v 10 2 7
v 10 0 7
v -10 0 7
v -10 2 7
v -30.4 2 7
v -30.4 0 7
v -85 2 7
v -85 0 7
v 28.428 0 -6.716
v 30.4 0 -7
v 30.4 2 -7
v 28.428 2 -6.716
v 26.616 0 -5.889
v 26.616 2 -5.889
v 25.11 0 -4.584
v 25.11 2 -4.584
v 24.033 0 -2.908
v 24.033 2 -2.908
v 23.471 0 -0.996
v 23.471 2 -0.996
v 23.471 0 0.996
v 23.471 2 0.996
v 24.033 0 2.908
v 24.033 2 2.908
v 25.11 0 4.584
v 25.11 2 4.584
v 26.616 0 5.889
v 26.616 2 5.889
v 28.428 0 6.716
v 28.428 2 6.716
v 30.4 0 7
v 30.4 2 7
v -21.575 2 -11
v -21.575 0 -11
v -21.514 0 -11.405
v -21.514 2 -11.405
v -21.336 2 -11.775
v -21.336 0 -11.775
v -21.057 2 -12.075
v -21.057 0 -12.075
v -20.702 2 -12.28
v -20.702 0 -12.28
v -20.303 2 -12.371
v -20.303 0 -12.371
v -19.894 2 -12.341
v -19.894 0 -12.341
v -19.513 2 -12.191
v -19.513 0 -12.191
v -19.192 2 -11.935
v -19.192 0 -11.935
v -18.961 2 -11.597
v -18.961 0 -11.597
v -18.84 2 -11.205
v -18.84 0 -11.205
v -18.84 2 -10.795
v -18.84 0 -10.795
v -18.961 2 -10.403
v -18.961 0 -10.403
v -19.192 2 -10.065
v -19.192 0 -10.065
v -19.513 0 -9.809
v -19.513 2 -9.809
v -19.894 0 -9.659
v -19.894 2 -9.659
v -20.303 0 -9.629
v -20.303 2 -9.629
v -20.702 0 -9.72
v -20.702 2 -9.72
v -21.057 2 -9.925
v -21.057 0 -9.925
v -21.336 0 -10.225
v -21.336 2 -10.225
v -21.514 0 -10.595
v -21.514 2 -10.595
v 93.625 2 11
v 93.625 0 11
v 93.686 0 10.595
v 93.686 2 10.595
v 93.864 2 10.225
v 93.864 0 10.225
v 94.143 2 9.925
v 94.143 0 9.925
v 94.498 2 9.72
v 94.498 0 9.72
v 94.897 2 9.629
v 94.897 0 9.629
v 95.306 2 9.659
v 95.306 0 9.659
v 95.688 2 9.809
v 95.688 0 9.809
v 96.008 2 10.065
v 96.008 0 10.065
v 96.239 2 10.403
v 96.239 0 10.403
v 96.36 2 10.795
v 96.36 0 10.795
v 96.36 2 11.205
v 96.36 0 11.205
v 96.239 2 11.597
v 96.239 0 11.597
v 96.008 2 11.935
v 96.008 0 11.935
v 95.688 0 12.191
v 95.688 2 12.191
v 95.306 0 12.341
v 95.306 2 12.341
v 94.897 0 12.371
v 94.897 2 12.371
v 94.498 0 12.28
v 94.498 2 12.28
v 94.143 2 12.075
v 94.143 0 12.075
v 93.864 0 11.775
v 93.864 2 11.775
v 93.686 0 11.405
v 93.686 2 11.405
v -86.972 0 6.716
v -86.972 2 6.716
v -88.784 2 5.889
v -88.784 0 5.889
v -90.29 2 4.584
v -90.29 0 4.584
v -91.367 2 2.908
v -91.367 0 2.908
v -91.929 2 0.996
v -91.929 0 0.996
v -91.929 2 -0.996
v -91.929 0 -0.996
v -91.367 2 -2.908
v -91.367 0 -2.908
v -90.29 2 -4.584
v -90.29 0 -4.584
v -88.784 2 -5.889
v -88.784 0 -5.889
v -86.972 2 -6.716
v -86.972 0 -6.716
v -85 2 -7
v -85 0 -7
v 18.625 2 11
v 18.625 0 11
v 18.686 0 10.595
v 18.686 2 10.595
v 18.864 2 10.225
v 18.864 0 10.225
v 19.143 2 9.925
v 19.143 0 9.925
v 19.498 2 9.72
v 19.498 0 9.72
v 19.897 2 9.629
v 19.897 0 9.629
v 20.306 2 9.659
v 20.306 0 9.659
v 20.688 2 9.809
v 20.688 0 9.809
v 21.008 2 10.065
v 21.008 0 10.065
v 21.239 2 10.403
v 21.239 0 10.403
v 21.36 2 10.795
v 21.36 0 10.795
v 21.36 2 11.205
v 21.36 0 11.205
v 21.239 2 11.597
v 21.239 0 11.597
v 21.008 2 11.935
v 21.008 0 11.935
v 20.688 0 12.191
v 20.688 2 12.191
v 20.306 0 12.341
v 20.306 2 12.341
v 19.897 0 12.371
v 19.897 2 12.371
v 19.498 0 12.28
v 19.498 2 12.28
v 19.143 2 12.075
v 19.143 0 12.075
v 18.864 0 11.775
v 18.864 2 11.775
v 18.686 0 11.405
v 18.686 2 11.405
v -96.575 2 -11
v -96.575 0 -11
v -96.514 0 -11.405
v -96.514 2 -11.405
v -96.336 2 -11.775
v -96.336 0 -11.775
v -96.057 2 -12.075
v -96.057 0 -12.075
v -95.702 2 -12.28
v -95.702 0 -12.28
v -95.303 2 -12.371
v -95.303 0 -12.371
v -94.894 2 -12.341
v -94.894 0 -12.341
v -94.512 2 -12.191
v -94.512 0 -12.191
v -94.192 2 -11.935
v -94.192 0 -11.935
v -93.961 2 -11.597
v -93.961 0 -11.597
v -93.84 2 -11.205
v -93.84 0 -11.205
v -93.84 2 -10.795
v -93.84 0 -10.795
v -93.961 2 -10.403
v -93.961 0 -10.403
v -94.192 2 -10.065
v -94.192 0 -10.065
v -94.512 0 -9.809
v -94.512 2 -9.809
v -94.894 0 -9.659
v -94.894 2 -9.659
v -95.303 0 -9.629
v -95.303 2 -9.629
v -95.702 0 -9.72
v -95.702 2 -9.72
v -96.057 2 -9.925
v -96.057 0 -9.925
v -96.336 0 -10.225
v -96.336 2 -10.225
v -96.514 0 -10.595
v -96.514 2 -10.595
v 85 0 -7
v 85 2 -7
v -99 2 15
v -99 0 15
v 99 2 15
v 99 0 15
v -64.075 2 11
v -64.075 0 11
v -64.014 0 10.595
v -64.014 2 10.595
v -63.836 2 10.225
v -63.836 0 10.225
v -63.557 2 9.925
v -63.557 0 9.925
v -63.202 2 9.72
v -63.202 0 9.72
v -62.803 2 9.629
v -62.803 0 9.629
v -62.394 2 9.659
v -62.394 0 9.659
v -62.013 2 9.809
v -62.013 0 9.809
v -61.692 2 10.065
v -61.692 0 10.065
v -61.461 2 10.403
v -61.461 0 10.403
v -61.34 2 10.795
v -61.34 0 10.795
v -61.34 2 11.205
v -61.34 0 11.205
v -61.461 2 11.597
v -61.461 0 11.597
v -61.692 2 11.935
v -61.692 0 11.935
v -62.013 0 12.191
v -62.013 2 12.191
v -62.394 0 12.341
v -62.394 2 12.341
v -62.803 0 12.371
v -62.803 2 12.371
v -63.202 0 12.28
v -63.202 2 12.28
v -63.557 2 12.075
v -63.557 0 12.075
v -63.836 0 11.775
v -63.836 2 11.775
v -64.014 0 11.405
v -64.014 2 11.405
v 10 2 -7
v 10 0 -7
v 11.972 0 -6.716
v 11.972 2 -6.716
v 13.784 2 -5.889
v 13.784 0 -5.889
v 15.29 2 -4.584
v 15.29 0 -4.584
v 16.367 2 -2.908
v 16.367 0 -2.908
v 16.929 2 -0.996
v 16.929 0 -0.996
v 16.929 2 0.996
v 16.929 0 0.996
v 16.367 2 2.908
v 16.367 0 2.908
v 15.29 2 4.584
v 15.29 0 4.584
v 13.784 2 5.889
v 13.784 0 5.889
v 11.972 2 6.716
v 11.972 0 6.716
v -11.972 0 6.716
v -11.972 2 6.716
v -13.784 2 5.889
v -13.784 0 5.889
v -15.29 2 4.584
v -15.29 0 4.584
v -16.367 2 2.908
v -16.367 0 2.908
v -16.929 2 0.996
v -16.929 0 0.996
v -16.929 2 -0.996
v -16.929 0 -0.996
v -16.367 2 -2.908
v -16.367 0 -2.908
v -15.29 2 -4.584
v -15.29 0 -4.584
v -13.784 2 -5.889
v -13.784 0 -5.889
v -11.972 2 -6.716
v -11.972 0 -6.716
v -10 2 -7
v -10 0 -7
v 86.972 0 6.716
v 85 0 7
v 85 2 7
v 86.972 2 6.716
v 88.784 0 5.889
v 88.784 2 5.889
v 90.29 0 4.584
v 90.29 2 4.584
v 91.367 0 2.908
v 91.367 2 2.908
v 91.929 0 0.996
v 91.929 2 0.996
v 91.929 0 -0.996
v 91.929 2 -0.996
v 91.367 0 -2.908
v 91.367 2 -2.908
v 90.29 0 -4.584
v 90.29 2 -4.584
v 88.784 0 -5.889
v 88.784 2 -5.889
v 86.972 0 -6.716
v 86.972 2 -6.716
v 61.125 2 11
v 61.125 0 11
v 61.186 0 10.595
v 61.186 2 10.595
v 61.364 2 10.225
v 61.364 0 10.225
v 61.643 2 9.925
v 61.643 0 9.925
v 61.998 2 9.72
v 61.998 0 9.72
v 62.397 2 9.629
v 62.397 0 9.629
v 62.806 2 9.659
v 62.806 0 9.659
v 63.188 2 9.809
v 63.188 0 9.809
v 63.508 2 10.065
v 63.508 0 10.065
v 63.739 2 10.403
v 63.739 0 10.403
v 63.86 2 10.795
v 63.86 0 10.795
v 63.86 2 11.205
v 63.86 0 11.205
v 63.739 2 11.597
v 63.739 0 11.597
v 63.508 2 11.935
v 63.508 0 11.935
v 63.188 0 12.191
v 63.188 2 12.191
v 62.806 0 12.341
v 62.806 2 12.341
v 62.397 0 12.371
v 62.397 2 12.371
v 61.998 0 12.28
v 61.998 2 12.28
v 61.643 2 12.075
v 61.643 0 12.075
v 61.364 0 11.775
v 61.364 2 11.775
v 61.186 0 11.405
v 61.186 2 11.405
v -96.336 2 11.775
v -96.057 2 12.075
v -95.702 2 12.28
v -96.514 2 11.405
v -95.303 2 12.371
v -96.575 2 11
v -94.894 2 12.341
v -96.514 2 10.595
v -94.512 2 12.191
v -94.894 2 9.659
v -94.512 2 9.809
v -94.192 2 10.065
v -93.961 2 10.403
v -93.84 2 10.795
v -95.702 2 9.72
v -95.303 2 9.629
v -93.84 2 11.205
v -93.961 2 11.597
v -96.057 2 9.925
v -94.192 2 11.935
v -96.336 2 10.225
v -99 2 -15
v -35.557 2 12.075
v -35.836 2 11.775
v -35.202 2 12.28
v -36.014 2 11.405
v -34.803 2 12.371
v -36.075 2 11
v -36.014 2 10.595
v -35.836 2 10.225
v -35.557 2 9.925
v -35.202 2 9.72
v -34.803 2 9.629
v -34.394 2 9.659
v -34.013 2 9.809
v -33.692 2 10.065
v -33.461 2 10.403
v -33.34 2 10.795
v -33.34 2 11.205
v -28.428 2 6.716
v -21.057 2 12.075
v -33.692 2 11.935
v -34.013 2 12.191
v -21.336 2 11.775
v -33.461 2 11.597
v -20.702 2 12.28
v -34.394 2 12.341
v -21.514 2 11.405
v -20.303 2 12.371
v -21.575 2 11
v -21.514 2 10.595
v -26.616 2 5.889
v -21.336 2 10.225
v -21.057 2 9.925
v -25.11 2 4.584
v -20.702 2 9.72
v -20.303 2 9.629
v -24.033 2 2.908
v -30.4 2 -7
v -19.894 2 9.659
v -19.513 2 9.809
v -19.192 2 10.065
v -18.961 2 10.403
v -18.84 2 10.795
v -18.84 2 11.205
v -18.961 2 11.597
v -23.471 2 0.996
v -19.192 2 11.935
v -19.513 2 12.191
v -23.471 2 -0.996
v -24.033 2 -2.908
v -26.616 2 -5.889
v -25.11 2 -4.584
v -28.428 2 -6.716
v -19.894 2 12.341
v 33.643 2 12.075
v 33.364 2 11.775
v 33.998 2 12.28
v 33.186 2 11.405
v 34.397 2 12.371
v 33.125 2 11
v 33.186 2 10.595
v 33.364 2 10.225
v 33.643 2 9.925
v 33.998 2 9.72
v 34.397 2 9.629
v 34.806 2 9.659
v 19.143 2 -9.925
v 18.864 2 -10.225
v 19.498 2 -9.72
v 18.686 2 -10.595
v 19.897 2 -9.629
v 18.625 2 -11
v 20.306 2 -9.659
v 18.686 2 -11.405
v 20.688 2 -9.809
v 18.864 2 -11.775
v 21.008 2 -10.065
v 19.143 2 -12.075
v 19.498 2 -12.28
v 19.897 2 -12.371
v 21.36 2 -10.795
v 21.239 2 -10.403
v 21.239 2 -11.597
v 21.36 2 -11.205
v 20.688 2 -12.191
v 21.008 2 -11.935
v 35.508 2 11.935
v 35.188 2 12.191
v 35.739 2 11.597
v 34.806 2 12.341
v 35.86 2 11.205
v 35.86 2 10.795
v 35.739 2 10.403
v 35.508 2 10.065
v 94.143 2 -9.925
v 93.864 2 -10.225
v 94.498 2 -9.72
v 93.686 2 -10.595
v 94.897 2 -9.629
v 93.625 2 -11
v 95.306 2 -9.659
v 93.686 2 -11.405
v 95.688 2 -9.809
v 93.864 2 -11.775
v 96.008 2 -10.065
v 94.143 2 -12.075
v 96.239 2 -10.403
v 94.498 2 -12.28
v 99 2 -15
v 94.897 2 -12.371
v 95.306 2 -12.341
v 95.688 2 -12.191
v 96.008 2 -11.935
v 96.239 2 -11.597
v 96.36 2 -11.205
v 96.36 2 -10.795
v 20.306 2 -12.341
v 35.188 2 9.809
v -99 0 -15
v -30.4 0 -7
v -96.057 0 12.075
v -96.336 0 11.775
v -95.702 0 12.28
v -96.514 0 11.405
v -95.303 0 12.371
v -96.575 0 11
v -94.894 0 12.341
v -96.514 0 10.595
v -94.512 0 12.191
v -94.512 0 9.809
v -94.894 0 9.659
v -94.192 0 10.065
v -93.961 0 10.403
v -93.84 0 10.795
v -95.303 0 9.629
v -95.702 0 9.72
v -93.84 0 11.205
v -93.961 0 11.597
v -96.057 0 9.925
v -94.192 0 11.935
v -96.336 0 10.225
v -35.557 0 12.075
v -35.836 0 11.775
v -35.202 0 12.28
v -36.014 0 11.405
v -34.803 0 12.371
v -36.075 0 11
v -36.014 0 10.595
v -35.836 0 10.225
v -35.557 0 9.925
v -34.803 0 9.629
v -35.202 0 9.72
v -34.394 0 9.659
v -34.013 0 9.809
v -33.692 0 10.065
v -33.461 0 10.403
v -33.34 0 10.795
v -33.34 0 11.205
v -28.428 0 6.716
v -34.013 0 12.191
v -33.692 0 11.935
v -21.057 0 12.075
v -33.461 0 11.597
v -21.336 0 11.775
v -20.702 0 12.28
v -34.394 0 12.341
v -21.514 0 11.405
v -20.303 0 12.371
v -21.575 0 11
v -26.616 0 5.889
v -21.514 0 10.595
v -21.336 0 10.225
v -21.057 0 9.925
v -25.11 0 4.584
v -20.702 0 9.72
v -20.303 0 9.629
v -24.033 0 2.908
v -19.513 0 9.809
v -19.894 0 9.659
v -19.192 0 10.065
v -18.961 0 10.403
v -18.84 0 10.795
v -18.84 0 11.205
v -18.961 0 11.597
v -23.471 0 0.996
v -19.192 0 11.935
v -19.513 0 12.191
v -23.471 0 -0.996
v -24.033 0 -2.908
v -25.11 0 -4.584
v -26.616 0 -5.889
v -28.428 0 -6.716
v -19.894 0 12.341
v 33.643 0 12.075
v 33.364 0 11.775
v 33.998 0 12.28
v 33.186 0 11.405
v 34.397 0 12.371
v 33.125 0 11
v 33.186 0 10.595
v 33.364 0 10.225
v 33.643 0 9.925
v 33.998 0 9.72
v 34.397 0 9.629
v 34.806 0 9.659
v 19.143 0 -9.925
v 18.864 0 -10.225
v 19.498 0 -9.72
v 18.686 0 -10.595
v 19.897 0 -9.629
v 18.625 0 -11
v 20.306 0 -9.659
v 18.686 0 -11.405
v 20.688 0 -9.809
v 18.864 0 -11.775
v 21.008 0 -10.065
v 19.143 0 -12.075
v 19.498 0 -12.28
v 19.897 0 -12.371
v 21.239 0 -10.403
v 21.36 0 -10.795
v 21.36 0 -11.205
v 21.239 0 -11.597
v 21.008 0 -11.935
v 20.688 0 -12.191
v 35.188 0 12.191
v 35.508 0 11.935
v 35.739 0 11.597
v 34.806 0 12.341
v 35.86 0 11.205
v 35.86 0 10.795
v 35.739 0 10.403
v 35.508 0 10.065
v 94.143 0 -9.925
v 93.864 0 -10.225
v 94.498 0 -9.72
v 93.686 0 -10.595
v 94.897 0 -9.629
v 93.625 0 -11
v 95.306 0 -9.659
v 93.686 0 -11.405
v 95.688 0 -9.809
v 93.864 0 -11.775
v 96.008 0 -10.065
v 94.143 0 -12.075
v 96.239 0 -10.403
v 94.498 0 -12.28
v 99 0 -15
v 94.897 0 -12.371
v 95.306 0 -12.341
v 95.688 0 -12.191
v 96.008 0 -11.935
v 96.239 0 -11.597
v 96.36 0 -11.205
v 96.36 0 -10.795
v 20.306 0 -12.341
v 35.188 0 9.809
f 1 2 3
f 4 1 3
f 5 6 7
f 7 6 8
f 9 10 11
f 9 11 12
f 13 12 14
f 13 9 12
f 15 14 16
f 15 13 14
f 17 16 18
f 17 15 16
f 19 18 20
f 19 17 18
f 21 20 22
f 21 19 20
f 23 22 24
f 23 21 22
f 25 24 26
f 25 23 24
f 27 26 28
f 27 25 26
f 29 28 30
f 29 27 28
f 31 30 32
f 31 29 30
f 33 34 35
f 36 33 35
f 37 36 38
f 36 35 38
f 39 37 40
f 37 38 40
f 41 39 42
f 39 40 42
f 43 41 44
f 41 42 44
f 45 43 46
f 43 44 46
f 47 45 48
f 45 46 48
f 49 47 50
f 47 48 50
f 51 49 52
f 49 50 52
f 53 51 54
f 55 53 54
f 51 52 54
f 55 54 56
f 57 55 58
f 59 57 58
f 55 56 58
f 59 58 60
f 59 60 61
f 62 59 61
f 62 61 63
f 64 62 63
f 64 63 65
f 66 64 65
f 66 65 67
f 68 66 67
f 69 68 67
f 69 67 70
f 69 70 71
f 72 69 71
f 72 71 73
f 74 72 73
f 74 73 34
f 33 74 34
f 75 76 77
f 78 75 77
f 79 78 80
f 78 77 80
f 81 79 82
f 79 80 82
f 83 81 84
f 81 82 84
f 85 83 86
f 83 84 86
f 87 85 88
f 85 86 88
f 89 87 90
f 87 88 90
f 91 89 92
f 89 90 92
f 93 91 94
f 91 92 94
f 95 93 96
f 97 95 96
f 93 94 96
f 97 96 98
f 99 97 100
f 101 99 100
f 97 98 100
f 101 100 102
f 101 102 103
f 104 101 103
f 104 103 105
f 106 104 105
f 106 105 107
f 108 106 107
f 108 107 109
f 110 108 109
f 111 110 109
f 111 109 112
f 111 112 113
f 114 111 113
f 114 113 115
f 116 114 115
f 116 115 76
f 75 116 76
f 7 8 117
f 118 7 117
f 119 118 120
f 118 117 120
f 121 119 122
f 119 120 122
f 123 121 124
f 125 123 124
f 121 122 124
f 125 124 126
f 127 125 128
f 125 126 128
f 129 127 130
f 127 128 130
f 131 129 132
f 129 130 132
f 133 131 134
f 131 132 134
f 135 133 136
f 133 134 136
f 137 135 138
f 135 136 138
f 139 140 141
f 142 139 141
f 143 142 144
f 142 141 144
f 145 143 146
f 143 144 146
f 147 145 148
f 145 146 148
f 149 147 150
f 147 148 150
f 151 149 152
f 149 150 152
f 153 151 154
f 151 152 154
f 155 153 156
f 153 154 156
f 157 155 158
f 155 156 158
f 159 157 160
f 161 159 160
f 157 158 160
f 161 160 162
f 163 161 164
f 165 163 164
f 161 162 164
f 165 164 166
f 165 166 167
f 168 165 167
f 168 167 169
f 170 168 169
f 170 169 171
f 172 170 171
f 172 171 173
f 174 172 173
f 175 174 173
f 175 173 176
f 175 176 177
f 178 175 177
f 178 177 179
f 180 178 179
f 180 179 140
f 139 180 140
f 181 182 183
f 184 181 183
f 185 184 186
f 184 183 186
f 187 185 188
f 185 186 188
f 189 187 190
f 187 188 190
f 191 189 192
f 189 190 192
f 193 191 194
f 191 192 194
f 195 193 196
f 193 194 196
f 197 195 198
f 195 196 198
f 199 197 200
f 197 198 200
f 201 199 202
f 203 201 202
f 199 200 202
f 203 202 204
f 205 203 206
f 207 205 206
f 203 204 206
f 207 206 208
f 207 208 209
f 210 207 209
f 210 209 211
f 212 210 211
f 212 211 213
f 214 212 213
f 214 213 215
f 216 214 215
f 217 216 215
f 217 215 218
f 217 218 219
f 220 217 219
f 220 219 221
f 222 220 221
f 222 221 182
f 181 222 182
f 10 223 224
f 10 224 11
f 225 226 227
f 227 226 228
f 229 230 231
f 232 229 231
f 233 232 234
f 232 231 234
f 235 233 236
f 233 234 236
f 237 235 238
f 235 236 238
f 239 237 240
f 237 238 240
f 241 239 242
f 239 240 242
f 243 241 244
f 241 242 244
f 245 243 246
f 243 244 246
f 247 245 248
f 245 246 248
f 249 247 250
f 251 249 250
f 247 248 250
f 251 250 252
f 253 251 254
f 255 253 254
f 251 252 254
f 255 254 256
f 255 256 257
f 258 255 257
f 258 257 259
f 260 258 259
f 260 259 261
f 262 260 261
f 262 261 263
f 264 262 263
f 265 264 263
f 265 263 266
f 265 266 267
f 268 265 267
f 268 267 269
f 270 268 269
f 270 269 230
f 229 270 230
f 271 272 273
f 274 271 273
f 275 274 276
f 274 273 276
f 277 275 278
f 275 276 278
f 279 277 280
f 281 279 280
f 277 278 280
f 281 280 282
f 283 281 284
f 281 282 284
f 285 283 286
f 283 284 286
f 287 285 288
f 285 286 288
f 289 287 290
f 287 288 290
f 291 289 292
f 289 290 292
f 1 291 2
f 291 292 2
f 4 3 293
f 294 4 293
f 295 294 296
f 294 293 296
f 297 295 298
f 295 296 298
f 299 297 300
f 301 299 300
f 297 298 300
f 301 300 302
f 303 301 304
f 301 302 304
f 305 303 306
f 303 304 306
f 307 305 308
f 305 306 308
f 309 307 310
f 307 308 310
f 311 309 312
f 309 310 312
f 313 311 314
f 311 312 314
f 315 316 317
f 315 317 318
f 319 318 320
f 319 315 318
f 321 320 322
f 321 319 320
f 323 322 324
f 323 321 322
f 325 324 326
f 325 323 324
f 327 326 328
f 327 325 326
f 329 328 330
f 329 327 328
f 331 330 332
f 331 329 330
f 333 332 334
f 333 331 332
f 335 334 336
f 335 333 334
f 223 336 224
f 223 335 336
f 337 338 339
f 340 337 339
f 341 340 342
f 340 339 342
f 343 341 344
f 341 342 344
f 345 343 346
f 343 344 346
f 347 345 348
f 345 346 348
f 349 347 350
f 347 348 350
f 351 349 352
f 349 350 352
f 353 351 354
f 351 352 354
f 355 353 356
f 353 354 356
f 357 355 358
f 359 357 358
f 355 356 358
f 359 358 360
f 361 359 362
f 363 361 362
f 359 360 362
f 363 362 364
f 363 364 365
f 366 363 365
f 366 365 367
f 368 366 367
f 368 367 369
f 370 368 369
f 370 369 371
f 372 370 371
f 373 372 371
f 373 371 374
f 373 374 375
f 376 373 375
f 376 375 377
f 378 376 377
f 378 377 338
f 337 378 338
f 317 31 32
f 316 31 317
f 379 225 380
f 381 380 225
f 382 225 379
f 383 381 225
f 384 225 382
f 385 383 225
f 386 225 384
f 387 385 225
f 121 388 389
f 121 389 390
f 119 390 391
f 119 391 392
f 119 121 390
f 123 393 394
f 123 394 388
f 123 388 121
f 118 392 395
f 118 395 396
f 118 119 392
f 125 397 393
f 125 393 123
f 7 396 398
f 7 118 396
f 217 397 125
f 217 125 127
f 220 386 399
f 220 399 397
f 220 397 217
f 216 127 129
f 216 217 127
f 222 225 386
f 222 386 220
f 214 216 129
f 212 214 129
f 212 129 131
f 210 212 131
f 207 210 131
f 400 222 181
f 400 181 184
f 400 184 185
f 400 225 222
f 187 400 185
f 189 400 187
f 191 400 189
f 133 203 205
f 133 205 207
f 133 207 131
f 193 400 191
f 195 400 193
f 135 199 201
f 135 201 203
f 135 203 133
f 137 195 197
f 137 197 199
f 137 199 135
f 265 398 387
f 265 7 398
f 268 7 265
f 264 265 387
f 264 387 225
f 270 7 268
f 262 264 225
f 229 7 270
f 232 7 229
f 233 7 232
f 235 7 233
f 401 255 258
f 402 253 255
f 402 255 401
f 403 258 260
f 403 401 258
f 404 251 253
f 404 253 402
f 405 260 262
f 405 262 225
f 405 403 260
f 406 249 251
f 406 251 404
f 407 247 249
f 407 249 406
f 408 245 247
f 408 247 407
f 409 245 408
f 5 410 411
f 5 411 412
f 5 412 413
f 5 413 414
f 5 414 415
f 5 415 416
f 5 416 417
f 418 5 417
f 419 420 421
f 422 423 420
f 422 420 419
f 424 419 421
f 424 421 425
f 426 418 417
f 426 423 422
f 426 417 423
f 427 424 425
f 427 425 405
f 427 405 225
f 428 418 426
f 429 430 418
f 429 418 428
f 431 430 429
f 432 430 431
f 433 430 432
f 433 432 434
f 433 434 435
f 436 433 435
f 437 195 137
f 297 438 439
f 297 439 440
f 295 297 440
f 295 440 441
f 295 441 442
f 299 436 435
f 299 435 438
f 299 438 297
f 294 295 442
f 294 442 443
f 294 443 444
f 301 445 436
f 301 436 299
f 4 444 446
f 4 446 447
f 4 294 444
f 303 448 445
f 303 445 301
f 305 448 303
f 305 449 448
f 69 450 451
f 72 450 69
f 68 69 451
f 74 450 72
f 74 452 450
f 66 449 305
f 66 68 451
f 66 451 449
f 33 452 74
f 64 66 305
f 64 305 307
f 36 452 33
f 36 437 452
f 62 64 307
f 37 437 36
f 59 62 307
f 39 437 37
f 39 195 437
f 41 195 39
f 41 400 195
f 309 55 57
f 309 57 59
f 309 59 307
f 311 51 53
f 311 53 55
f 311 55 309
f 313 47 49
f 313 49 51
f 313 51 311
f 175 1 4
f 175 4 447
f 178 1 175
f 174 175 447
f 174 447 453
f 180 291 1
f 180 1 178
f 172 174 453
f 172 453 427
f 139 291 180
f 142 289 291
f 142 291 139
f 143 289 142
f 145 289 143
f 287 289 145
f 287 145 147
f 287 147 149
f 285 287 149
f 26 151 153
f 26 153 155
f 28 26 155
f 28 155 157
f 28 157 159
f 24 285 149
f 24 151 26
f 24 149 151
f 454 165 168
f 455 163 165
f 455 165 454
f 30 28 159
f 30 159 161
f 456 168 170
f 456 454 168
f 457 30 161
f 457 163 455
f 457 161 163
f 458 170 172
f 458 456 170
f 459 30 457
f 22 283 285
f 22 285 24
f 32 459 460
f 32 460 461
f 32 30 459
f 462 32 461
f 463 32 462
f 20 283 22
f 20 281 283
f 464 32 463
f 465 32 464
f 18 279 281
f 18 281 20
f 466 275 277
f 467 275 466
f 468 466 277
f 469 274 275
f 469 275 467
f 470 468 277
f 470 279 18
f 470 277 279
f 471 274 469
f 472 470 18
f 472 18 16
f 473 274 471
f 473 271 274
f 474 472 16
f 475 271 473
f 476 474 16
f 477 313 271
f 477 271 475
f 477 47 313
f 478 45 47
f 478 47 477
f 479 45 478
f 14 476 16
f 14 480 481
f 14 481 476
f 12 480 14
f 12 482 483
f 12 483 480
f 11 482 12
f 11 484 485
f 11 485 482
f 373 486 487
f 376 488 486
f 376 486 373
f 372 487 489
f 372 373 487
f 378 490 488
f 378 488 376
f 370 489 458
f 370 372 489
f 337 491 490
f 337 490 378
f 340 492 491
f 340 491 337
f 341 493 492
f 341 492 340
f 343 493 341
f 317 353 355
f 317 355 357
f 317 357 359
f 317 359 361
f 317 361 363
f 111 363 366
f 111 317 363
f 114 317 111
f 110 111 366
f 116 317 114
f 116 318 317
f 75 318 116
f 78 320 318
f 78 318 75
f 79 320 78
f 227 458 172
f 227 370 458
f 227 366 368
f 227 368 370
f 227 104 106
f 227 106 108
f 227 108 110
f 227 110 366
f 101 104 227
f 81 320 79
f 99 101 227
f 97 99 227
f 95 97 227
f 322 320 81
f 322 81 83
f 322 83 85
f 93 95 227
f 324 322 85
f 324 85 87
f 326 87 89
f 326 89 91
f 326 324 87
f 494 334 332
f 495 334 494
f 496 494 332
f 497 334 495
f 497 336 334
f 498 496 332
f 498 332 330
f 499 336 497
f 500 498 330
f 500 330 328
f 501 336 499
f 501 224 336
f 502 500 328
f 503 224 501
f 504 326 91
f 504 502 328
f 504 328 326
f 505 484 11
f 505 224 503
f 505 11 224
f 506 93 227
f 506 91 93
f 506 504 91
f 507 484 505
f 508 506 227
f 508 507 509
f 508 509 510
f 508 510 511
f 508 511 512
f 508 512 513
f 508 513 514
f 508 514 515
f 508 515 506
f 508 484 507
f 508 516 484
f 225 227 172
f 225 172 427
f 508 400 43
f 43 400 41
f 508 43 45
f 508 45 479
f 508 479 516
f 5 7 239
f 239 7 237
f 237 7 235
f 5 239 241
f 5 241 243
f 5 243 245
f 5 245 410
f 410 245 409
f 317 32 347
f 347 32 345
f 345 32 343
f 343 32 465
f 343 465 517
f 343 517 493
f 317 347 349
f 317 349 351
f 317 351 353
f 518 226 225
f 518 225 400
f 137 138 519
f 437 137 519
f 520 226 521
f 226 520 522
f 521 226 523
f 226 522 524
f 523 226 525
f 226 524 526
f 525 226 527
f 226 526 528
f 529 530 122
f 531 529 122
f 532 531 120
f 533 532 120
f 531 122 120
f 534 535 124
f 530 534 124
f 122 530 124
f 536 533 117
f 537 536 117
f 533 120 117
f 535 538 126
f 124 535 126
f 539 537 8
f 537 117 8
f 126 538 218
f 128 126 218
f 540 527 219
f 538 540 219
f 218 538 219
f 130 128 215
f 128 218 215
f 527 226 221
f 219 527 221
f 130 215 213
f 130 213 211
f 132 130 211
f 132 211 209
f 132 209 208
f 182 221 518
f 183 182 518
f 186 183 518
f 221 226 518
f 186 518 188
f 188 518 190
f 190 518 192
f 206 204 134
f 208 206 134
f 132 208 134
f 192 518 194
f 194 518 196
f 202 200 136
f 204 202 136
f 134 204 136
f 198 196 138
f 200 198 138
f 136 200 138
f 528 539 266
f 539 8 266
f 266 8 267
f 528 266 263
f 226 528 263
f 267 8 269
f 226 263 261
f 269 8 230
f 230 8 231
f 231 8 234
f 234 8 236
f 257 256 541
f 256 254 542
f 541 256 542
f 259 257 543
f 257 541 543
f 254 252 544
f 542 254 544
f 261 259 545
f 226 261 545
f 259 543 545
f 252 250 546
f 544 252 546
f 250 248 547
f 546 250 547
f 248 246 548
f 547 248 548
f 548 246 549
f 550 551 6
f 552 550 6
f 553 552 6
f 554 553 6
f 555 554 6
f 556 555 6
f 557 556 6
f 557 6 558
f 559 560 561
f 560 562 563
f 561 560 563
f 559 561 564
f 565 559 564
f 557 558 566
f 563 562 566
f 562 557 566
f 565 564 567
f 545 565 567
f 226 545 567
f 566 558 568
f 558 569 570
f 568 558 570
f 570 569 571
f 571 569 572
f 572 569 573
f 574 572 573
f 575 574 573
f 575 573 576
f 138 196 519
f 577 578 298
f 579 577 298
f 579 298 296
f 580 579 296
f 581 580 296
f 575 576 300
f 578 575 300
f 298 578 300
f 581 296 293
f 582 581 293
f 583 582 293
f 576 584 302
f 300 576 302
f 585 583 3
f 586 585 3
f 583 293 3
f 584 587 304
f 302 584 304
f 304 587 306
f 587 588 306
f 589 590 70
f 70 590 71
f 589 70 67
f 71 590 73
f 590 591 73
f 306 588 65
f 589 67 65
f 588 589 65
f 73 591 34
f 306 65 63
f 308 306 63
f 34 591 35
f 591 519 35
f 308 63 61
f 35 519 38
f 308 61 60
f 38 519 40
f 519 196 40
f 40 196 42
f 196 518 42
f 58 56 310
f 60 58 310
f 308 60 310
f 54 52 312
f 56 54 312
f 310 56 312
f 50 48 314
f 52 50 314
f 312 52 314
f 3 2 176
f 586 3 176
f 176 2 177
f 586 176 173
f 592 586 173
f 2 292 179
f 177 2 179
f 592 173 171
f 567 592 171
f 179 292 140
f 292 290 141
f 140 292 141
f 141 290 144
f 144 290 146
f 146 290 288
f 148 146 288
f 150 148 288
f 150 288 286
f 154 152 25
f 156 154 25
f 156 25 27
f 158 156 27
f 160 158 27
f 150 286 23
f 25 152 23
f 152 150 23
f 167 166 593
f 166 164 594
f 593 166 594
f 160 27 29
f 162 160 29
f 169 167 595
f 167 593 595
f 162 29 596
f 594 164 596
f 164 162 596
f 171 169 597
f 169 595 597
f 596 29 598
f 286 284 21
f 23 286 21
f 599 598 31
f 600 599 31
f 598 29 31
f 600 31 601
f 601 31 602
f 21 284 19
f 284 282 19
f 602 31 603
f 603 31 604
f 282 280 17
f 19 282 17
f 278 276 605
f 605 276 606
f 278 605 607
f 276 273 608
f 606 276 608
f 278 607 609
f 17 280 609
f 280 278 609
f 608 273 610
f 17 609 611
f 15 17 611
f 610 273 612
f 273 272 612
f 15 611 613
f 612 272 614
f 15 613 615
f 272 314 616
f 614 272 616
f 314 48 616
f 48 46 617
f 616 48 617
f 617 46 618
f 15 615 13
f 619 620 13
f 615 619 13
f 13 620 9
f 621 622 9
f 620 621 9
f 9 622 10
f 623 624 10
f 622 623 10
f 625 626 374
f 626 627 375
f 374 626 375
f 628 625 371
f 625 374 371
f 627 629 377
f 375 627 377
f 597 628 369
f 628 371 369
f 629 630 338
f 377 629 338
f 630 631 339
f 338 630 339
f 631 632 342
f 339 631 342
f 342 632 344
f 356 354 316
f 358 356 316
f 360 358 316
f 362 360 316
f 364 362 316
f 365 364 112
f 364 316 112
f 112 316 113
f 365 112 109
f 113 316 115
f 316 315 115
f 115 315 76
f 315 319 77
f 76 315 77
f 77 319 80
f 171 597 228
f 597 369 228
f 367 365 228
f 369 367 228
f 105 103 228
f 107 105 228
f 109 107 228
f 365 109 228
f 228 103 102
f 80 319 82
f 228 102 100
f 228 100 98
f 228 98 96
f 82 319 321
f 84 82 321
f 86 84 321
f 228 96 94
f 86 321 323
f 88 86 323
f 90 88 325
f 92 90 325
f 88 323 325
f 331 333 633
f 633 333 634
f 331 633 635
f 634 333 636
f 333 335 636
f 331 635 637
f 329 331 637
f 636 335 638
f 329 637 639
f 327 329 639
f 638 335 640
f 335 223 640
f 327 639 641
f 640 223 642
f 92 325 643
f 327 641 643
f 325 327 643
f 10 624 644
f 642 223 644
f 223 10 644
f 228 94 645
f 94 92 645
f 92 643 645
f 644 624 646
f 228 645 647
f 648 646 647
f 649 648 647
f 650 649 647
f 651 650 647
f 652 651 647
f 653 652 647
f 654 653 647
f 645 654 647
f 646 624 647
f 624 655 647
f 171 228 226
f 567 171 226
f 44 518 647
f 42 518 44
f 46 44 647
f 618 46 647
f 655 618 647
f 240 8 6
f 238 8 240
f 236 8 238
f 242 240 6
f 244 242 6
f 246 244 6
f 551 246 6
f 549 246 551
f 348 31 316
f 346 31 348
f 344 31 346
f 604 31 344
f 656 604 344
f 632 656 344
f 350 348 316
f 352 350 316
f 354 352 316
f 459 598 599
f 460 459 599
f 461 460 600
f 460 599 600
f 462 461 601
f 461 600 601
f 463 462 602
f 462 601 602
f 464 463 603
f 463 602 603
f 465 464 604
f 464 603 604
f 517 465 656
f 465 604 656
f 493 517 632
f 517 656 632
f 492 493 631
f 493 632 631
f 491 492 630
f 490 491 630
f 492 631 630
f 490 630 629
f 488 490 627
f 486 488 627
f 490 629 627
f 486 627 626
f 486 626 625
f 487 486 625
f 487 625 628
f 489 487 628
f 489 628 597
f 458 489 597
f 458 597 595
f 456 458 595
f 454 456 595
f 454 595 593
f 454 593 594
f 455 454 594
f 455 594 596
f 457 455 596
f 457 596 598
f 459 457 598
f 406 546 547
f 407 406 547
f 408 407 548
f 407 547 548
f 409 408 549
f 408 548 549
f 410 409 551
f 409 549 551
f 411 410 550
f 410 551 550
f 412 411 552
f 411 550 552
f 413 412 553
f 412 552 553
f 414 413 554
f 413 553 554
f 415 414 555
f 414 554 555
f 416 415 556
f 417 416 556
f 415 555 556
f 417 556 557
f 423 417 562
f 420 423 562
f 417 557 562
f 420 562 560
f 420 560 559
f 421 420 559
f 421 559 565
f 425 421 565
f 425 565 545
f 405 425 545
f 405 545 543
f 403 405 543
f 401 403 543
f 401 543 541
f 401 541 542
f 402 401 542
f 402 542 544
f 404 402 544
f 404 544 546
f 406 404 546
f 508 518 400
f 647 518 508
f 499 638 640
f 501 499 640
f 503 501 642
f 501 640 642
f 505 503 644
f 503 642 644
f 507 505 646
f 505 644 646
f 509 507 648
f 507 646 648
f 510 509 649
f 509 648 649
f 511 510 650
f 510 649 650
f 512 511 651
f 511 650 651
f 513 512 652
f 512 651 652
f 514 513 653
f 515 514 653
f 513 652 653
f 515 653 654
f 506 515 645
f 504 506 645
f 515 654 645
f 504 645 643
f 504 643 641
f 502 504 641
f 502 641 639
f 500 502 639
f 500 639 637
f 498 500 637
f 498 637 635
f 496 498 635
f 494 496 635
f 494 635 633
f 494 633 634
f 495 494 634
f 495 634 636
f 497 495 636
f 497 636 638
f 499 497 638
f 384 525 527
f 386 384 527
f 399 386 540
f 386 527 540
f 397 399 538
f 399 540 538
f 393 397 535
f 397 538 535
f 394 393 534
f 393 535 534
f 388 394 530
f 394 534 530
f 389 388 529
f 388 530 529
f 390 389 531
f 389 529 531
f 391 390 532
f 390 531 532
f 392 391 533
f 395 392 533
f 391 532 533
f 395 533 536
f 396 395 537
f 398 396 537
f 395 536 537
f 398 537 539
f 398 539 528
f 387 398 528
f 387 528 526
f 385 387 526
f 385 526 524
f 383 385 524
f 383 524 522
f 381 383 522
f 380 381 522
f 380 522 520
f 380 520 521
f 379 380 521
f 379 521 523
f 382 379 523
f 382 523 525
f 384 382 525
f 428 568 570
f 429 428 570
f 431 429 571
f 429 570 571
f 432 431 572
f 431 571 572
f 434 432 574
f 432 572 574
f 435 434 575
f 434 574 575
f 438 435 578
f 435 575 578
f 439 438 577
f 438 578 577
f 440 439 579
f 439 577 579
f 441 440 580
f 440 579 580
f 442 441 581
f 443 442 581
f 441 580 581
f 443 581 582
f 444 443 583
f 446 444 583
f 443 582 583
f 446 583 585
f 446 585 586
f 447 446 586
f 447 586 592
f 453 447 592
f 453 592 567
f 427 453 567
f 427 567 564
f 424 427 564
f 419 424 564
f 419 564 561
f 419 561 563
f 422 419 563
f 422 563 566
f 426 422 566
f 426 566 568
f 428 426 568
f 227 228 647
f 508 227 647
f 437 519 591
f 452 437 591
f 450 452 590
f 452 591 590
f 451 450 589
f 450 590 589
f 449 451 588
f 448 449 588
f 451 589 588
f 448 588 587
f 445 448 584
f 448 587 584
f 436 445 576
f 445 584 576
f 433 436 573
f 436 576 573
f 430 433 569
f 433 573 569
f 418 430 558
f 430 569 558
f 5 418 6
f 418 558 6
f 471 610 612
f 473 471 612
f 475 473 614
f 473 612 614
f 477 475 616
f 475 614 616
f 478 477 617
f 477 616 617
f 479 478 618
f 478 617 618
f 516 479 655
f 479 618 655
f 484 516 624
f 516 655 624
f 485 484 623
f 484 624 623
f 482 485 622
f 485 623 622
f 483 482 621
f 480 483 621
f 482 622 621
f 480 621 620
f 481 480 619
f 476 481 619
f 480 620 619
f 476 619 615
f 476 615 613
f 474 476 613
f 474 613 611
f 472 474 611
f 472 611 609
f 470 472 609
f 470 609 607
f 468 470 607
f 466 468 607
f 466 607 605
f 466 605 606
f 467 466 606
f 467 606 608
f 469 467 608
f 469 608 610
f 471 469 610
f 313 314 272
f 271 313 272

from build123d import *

# Parameters (mm, degrees)
SKETCH_1_W               = 198
SKETCH_1_H               = 30
EXTRUDE_1_DEPTH          = 2
HOLE_WIZARD_1_D          = 2.75
HOLE_WIZARD_1_DEPTH      = 100
CUT_EXTRUDE_1_DEPTH      = 101.149887668
CUT_EXTRUDE_1_DEPTH_BACK = 101.149887668


with BuildPart() as part:
    # 草图1 → 凸台-拉伸1 (new body)
    with BuildSketch(Plane(origin=(0, 0, 0), x_dir=(1, 0, 0), z_dir=(0, 1, 0))):
        Rectangle(SKETCH_1_W, SKETCH_1_H)
    extrude(amount=EXTRUDE_1_DEPTH)

    # 孔1
    with Locations(Plane(origin=(0, 2, 0), x_dir=(1, 0, 0), z_dir=(0, 1, 0))):
        with Locations((95, 10.999999819), (95, -11), (20.000000003, 10.999999819), (20.000000003, -11), (-95.2, 10.999999819), (-95.2, -11), (-20.200000003, 10.999999819), (-20.200000003, -11), (-34.700003407, -11), (-62.700003407, -11), (62.500003407, -11), (34.500003407, -11)):
            Hole(HOLE_WIZARD_1_D / 2, depth=HOLE_WIZARD_1_DEPTH)

    # 草图4 → 切除-拉伸1 (cut, two sides: drawn at the far end of the back side and taken through both)
    with BuildSketch(Plane(origin=(0, 2, 0), x_dir=(1, 0, 0), z_dir=(0, 1, 0)).offset(-CUT_EXTRUDE_1_DEPTH_BACK)):
        with BuildLine():
            Line((-10, 7), (10, 7))
            ThreePointArc((10, 7), (17, 0), (10, -7))
            Line((10, -7), (-10, -7))
            ThreePointArc((-10, -7), (-17, 0), (-10, 7))
        make_face()
        with BuildLine():
            Line((-84.999999997, 7), (-30.400000007, 7))
            ThreePointArc((-30.400000007, 7), (-23.400000007, 0), (-30.400000007, -7))
            Line((-30.400000007, -7), (-84.999999997, -7))
            ThreePointArc((-84.999999997, -7), (-91.999999997, 0), (-84.999999997, 7))
        make_face()
        with BuildLine():
            Line((84.999999997, 7), (30.400000007, 7))
            ThreePointArc((30.400000007, 7), (23.400000007, 0), (30.400000007, -7))
            Line((30.400000007, -7), (84.999999997, -7))
            ThreePointArc((84.999999997, -7), (91.999999997, 0), (84.999999997, 7))
        make_face()
    extrude(amount=CUT_EXTRUDE_1_DEPTH + CUT_EXTRUDE_1_DEPTH_BACK, mode=Mode.SUBTRACT)


solid = part.part
